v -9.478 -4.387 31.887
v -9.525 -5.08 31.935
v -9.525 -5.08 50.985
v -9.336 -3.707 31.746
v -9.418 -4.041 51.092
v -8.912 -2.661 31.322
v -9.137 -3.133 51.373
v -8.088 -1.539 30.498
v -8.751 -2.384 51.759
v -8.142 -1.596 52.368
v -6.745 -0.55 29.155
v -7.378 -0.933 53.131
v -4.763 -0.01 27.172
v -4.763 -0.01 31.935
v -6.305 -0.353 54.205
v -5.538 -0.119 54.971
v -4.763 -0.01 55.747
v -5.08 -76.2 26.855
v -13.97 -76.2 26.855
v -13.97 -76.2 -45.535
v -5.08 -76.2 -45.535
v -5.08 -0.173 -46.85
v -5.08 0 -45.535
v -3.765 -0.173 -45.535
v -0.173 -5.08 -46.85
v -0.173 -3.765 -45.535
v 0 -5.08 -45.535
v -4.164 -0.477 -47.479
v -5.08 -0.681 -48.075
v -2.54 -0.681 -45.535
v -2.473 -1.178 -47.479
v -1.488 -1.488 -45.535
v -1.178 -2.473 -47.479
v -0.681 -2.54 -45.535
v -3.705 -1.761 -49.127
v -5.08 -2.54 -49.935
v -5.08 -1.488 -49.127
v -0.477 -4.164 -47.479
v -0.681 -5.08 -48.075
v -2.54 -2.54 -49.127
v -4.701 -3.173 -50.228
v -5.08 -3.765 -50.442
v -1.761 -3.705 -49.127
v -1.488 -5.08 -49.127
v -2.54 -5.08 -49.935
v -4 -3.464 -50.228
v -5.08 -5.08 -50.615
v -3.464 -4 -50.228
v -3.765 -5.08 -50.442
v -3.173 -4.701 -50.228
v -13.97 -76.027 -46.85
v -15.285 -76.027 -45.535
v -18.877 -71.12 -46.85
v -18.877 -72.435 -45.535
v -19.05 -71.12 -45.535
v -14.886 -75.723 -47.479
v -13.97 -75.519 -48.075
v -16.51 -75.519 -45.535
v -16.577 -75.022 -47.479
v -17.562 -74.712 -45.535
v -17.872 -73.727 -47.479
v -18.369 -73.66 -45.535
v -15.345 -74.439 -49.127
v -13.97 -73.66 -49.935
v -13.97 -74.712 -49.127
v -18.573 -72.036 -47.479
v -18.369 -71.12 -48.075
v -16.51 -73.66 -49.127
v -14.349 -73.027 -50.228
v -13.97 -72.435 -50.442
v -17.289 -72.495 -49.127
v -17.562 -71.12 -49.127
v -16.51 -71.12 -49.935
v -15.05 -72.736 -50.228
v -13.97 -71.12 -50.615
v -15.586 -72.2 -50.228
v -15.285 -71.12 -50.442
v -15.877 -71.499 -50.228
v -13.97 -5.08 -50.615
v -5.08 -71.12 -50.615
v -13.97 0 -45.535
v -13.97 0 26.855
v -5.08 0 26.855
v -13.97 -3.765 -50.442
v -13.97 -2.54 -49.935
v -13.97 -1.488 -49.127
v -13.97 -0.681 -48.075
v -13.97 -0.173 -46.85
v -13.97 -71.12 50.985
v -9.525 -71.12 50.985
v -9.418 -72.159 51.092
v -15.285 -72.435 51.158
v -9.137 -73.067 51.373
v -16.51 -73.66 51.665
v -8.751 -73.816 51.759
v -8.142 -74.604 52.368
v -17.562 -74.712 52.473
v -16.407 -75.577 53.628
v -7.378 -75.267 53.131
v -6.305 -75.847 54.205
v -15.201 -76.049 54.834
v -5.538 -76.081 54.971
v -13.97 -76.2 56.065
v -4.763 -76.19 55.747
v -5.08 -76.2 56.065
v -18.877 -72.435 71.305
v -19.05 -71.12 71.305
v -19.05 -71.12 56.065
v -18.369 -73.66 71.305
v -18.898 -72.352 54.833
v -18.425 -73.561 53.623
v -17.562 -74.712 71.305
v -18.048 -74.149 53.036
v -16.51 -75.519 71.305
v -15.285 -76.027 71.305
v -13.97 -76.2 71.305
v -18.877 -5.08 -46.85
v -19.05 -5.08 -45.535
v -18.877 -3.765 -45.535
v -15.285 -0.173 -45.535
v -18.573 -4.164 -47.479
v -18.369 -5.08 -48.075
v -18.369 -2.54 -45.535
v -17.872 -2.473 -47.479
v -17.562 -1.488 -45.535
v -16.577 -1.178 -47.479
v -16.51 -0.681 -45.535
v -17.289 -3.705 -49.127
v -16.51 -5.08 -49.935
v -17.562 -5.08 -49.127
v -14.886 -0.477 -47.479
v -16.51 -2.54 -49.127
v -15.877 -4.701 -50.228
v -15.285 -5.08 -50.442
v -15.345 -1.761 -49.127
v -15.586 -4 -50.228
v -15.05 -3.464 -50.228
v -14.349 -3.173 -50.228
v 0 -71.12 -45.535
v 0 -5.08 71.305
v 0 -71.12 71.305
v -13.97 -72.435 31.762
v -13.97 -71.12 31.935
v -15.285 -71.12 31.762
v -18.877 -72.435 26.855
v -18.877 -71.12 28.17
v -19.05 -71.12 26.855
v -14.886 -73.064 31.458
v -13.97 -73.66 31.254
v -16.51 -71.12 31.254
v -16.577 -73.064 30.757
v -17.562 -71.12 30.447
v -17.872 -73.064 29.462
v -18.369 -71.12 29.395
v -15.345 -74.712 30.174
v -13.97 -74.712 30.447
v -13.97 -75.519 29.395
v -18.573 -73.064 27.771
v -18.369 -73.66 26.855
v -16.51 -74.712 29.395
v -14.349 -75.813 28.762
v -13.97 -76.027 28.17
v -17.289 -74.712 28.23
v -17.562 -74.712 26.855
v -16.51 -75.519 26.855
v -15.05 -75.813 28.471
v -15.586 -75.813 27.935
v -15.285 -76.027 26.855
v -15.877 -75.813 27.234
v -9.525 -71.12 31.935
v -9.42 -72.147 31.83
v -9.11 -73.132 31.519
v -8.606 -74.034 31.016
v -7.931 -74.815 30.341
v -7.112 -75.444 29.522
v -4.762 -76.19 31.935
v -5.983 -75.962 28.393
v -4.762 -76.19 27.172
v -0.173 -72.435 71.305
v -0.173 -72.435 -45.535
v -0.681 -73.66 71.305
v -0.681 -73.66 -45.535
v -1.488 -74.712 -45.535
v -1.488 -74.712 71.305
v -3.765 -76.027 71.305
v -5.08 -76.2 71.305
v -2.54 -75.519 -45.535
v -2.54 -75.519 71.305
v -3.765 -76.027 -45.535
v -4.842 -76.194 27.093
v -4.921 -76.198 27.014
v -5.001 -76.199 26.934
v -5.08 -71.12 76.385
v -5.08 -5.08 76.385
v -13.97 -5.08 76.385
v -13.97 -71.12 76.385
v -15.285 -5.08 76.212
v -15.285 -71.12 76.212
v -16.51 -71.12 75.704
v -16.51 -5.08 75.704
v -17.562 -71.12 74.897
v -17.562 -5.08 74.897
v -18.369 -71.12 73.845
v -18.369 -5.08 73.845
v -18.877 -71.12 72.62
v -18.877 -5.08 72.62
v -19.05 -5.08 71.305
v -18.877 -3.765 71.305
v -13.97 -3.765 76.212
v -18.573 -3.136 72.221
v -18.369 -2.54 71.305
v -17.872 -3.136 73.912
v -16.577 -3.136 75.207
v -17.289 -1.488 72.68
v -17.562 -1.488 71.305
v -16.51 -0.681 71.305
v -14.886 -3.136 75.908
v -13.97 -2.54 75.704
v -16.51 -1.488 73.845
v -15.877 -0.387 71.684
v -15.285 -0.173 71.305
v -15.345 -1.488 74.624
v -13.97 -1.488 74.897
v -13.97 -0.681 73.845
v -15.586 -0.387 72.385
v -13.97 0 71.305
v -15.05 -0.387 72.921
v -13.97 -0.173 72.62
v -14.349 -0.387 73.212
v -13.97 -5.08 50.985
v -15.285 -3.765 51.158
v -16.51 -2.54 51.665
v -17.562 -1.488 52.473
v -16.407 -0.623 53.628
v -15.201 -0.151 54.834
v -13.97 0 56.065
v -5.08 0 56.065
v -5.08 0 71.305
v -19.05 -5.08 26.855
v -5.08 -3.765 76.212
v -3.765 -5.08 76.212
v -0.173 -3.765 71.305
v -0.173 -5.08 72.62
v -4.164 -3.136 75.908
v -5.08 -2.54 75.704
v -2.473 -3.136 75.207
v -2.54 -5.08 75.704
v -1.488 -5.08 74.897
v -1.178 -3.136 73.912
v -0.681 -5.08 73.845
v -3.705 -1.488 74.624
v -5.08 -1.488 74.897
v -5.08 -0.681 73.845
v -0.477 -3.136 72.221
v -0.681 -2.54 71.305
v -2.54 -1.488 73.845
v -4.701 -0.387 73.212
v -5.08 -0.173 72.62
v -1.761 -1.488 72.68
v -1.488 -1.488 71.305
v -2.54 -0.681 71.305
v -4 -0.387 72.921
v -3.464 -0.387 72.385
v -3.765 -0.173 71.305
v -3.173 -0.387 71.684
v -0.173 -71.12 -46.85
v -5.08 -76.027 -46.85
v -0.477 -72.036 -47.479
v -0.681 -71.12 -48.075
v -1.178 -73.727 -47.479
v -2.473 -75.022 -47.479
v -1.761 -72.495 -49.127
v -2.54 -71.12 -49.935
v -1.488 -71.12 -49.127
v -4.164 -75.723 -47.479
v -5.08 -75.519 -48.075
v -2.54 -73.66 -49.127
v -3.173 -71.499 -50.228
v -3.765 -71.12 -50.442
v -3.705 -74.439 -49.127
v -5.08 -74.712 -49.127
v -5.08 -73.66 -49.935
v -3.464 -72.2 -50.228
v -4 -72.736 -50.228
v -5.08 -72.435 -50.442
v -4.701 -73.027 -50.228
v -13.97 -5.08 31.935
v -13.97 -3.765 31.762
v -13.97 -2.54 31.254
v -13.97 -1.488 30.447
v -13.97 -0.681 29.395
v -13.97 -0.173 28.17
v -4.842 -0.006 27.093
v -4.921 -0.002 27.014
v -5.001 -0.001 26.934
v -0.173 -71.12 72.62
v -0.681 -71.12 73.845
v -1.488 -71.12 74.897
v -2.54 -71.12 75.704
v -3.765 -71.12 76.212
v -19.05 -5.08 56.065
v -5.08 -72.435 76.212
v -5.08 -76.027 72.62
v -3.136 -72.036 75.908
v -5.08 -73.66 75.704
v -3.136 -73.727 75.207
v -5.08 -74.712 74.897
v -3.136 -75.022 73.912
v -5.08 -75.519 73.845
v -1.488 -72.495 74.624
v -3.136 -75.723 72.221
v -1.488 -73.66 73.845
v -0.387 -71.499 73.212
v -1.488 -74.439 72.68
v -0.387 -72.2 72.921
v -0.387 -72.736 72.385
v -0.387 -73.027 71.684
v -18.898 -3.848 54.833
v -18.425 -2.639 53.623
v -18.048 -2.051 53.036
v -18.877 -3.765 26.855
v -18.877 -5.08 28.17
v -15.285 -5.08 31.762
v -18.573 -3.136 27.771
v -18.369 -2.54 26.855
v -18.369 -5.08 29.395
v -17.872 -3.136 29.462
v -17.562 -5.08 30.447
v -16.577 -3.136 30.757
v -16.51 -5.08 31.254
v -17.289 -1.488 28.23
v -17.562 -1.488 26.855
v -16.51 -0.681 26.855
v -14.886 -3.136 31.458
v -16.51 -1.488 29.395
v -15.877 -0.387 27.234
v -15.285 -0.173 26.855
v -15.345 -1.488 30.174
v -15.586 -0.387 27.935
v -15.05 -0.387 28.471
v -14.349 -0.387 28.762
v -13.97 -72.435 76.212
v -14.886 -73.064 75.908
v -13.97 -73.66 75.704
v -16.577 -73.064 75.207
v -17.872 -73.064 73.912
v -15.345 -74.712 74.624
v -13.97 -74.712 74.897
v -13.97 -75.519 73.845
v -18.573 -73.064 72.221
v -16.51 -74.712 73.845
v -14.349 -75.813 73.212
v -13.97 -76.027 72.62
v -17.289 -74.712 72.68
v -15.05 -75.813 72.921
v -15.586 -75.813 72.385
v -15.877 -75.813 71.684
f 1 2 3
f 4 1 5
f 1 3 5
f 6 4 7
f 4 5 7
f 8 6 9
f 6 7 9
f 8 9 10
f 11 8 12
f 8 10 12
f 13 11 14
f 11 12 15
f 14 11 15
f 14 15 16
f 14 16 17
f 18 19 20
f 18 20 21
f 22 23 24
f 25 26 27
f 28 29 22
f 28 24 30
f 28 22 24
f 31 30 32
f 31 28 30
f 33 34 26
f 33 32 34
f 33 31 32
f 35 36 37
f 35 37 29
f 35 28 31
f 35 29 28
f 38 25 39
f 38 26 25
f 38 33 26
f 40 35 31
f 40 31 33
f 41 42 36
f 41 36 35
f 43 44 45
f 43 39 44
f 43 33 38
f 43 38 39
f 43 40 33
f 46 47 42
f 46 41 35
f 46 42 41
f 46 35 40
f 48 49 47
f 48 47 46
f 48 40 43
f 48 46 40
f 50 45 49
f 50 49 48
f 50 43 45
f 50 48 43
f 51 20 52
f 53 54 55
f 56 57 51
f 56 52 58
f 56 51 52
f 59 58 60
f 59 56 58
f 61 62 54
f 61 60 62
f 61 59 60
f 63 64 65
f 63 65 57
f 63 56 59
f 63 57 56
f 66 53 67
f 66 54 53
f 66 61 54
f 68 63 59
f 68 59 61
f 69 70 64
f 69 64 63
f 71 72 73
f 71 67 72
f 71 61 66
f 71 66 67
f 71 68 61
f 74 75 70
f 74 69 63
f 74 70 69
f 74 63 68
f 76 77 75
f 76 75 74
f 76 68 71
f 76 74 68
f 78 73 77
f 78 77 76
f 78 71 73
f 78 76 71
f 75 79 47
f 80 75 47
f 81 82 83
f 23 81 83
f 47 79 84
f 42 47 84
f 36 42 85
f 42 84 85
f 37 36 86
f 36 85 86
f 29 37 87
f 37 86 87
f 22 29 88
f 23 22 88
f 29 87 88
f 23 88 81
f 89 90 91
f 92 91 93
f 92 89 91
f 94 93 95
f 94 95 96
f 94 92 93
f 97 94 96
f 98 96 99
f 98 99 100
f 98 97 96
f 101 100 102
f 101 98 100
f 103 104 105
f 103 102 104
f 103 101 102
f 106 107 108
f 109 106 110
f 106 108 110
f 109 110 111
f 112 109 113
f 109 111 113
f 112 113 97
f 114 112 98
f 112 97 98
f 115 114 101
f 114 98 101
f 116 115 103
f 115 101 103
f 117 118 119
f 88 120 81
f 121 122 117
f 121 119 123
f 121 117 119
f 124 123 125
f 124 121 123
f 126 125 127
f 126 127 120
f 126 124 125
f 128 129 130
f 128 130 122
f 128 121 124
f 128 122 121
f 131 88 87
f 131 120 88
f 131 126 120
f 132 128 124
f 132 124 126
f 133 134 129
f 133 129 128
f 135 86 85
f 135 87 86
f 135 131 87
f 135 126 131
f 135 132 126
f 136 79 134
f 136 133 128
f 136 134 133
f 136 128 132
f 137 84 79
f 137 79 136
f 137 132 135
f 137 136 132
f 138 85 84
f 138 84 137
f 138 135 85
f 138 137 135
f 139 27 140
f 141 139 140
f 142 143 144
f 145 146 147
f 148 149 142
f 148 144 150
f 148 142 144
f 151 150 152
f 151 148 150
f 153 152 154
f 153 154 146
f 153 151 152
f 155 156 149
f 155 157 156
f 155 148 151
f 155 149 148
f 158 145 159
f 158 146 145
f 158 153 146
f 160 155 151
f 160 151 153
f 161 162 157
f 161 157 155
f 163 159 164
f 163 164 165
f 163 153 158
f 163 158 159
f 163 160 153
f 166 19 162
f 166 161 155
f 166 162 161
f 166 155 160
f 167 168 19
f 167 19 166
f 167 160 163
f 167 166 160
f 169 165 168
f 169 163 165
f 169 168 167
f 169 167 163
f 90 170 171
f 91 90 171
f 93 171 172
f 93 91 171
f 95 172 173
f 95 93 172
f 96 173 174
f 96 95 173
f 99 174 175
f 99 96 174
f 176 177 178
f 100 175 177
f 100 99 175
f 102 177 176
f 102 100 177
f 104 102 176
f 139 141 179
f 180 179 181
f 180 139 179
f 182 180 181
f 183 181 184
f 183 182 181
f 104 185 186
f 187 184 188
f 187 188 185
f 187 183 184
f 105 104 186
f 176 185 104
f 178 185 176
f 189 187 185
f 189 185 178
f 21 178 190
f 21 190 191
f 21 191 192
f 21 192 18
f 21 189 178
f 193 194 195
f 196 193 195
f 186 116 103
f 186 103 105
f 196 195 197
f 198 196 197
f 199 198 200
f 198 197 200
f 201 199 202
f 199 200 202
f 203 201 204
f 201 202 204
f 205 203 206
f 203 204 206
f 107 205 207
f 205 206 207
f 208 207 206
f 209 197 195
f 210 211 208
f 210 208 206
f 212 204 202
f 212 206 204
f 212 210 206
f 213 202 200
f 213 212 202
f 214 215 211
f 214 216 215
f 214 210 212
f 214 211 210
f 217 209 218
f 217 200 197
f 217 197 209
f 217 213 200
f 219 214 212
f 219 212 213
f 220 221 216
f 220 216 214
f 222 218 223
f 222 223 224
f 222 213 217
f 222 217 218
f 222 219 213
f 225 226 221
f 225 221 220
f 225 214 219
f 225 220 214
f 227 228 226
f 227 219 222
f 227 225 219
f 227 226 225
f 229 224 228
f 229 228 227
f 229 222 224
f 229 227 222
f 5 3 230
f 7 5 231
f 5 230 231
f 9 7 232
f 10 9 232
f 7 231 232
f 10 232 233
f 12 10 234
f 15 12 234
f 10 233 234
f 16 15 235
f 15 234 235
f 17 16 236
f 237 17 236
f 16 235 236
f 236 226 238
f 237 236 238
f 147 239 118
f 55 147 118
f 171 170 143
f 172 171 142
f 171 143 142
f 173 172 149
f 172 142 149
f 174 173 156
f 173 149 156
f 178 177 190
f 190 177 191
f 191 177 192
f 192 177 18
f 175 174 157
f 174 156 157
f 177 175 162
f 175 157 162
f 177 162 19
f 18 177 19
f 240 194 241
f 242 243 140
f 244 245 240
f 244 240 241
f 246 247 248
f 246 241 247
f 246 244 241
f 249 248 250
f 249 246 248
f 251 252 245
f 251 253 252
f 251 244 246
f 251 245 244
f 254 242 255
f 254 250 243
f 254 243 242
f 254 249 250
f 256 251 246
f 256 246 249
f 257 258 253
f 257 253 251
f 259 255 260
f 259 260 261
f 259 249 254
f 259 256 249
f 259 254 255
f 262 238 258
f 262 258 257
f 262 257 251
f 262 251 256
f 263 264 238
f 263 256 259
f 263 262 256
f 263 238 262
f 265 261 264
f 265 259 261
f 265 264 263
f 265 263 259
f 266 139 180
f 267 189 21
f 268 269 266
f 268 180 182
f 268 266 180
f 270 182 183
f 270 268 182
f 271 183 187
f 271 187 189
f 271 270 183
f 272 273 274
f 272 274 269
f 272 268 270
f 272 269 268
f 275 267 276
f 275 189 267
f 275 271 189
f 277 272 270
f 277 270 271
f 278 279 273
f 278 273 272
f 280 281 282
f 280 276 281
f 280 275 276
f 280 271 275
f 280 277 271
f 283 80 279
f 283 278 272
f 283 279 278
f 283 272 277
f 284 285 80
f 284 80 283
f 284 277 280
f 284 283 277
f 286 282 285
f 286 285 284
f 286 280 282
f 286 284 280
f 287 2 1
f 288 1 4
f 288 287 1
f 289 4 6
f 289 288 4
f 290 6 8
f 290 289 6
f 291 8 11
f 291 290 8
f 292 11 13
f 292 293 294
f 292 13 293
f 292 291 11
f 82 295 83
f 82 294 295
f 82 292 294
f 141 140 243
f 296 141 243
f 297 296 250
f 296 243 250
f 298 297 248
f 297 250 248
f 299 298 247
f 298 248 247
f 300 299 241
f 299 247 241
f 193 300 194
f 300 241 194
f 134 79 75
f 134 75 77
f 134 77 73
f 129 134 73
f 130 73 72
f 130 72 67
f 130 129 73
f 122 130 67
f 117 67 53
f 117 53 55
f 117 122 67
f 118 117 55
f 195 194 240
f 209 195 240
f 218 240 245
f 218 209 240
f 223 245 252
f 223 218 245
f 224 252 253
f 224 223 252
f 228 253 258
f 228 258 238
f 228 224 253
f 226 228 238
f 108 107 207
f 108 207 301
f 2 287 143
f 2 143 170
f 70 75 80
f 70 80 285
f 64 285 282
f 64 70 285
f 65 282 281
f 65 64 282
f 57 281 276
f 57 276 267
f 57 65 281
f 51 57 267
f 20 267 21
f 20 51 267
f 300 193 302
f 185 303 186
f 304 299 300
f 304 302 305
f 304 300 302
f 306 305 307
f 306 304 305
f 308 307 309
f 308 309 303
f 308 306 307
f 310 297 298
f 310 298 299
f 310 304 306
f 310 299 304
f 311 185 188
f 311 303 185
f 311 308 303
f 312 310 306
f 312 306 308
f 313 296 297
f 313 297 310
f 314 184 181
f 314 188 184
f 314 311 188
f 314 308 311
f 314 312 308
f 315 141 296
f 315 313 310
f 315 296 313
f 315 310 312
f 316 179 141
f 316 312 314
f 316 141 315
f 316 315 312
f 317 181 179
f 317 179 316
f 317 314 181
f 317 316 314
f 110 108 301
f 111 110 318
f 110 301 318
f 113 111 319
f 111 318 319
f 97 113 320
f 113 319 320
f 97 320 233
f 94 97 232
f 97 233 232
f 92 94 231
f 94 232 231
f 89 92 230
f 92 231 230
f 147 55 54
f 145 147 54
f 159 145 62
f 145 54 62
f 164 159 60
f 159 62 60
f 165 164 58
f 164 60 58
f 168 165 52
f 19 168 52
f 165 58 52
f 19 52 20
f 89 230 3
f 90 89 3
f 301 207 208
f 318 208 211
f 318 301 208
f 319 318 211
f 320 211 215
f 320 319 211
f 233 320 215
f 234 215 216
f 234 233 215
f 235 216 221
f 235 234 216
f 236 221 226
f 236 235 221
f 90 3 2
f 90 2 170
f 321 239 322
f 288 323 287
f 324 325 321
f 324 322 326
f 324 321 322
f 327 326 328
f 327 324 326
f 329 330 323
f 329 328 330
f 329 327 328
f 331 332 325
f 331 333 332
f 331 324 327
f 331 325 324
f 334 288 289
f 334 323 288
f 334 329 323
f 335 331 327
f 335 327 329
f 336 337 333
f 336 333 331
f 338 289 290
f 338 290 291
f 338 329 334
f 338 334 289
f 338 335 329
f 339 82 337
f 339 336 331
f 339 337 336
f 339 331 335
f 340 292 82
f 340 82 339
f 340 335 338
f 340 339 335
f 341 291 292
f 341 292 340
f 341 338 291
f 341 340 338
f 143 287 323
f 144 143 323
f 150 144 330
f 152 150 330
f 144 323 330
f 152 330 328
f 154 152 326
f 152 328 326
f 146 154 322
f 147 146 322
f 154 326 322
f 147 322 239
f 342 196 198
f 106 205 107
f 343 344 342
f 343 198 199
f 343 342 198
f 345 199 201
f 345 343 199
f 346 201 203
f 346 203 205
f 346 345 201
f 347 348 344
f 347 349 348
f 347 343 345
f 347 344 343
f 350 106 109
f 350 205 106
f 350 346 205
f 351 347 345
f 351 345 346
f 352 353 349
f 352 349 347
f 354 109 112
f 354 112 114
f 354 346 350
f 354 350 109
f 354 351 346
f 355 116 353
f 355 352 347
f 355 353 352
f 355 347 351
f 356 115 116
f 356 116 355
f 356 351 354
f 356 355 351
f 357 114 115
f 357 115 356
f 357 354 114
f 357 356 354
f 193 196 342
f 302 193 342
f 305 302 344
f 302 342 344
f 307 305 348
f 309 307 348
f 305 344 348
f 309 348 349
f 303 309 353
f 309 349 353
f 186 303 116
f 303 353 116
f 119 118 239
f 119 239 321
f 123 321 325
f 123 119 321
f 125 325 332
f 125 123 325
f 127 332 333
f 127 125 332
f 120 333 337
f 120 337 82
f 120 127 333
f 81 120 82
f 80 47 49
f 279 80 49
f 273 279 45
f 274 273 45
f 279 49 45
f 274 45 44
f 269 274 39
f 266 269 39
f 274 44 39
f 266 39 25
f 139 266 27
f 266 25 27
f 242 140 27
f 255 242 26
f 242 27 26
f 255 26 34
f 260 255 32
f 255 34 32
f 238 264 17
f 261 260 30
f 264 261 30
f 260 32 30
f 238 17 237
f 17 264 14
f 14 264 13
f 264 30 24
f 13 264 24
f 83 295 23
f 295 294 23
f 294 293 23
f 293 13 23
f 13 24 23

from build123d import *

# Parameters (mm, degrees)
F1_DEPTH      = 76.2
F2_T1_DEPTH   = 8.89
F2_T3_DEPTH   = 116.84
F2_T5_DEPTH   = 33.02
F2_T7_DEPTH   = 22.225
F2_T9_DEPTH   = 19.05
F2_T11_DEPTH  = 4.445
F2_T13_DEPTH  = 72.39
F2_T15_DEPTH  = 66.04
F2_S19_W      = 5.08
F2_S19_H      = 5.08
F2_T20_DEPTH  = 5.08
F2_S25_W      = 5.08
F2_S25_H      = 5.08
F2_T26_DEPTH  = 5.08
F2_S31_W      = 5.08
F2_S31_H      = 5.08
F2_T32_DEPTH  = 5.08
F2_S37_W      = 5.08
F2_S37_H      = 5.08
F2_T38_DEPTH  = 5.08
F2_S43_W      = 5.08
F2_S43_H      = 5.08
F2_T44_DEPTH  = 5.08
F2_S49_W      = 5.08
F2_S49_H      = 5.08
F2_T50_DEPTH  = 5.08
F2_S55_W      = 5.08
F2_S55_H      = 5.08
F2_T56_DEPTH  = 5.08
F2_S61_W      = 5.08
F2_S61_H      = 5.08
F2_T62_DEPTH  = 5.08
F2_S67_W      = 5.08
F2_S67_H      = 5.08
F2_T68_DEPTH  = 5.08
F2_S73_W      = 5.08
F2_S73_H      = 5.08
F2_T74_DEPTH  = 5.08
F2_T81_DEPTH  = 34.925
F2_T85_DEPTH  = 31.75
F2_T92_DEPTH  = 31.75
F2_T96_DEPTH  = 17.145
F2_T103_DEPTH = 34.925
F2_T107_DEPTH = 31.75
F2_T114_DEPTH = 31.75
F2_T118_DEPTH = 17.145
F3_T1_DEPTH   = 91.44


# Not quite as in the source:
# - a fillet or chamfer that OpenCascade refuses, or shapes differently, is made with other operations: its cross-section is extruded or revolved along the edge and cut away or added


with BuildPart() as f1:
    # F0 (on Front) → F1 (new body)
    with BuildSketch(Plane.XZ):
        Polygon((-19.05, -50.6151032805), (0, -50.6151032805), (0, 76.3848967195), (-19.05, 76.3848967195), (-19.05, 50.9848967195), (-9.525, 50.9848967195), (-9.525, 31.9348967195), (-19.05, 31.9348967195), align=None)
    extrude(amount=F1_DEPTH)

    # F2: fillet of radius 5.08 on 21 edges, made by hand

    # F2_s2 → F2_t1 (cut)
    with BuildSketch(Plane.YZ.offset(-13.97)):
        with BuildLine():
            ThreePointArc((-71.12, -50.6151032805), (-74.7121024484, -49.127205729), (-76.2, -45.5351032805))
            Line((-76.2, -45.5351032805), (-76.2, -50.6151032805))
            Line((-76.2, -50.6151032805), (-71.12, -50.6151032805))
        make_face()
        with BuildLine():
            ThreePointArc((-71.12, 76.3848967195), (-74.7121024484, 74.8969991679), (-76.2, 71.3048967195))
            Line((-76.2, 71.3048967195), (-76.2, 76.3848967195))
            Line((-76.2, 76.3848967195), (-71.12, 76.3848967195))
        make_face()
        with BuildLine():
            ThreePointArc((-5.08, 76.3848967195), (-1.4878975516, 74.8969991679), (0, 71.3048967195))
            Line((0, 71.3048967195), (0, 76.3848967195))
            Line((0, 76.3848967195), (-5.08, 76.3848967195))
        make_face()
        with BuildLine():
            ThreePointArc((-5.08, -50.6151032805), (-1.4878975516, -49.127205729), (0, -45.5351032805))
            Line((0, -45.5351032805), (0, -50.6151032805))
            Line((0, -50.6151032805), (-5.08, -50.6151032805))
        make_face()
    extrude(amount=F2_T1_DEPTH, mode=Mode.SUBTRACT)

    # F2_s4 → F2_t3 (cut)
    with BuildSketch(Plane.XY.offset(-45.5351032805)):
        with BuildLine():
            ThreePointArc((0, -71.12), (-1.4878975516, -74.7121024484), (-5.08, -76.2))
            Line((-5.08, -76.2), (0, -76.2))
            Line((0, -76.2), (0, -71.12))
        make_face()
        with BuildLine():
            ThreePointArc((0, -5.08), (-1.4878975516, -1.4878975516), (-5.08, 0))
            Line((-5.08, 0), (0, 0))
            Line((0, 0), (0, -5.08))
        make_face()
    extrude(amount=F2_T3_DEPTH, mode=Mode.SUBTRACT)

    # F2_s6 → F2_t5 (cut)
    with BuildSketch(Plane.XY.offset(38.2848967195)):
        with BuildLine():
            ThreePointArc((-19.05, -71.12), (-17.5621024484, -74.7121024484), (-13.97, -76.2))
            Line((-13.97, -76.2), (-19.05, -76.2))
            Line((-19.05, -76.2), (-19.05, -71.12))
        make_face()
        with BuildLine():
            ThreePointArc((-19.05, -5.08), (-17.5621024484, -1.4878975516), (-13.97, 0))
            Line((-13.97, 0), (-19.05, 0))
            Line((-19.05, 0), (-19.05, -5.08))
        make_face()
    extrude(amount=F2_T5_DEPTH, mode=Mode.SUBTRACT)

    # F2_s8 → F2_t7 (cut)
    with BuildSketch(Plane.YZ.offset(-31.75)):
        with BuildLine():
            ThreePointArc((-71.12, 50.9848967195), (-74.7121024484, 52.472794271), (-76.2, 56.0648967195))
            Line((-76.2, 56.0648967195), (-76.2, 50.9848967195))
            Line((-76.2, 50.9848967195), (-71.12, 50.9848967195))
        make_face()
        with BuildLine():
            ThreePointArc((-5.08, 50.9848967195), (-1.4878975516, 52.472794271), (0, 56.0648967195))
            Line((0, 56.0648967195), (0, 50.9848967195))
            Line((0, 50.9848967195), (-5.08, 50.9848967195))
        make_face()
    extrude(amount=F2_T7_DEPTH, mode=Mode.SUBTRACT)

    # F2_s10 → F2_t9 (cut)
    with BuildSketch(Plane.XY.offset(31.9348967195)):
        with BuildLine():
            ThreePointArc((-9.525, -71.12), (-8.0371024484, -74.7121024484), (-4.445, -76.2))
            Line((-4.445, -76.2), (-9.525, -76.2))
            Line((-9.525, -76.2), (-9.525, -71.12))
        make_face()
        with BuildLine():
            ThreePointArc((-9.525, -5.08), (-8.0371024484, -1.4878975516), (-4.445, 0))
            Line((-4.445, 0), (-9.525, 0))
            Line((-9.525, 0), (-9.525, -5.08))
        make_face()
    extrude(amount=F2_T9_DEPTH, mode=Mode.SUBTRACT)

    # F2_s12 → F2_t11 (cut)
    with BuildSketch(Plane.YZ.offset(-13.97)):
        with BuildLine():
            ThreePointArc((-71.12, 31.9348967195), (-74.7121024484, 30.4469991679), (-76.2, 26.8548967195))
            Line((-76.2, 26.8548967195), (-76.2, 31.9348967195))
            Line((-76.2, 31.9348967195), (-71.12, 31.9348967195))
        make_face()
        with BuildLine():
            ThreePointArc((-5.08, 31.9348967195), (-1.4878975516, 30.4469991679), (0, 26.8548967195))
            Line((0, 26.8548967195), (0, 31.9348967195))
            Line((0, 31.9348967195), (-5.08, 31.9348967195))
        make_face()
    extrude(amount=F2_T11_DEPTH, mode=Mode.SUBTRACT)

    # F2_s14 → F2_t13 (cut)
    with BuildSketch(Plane.XY.offset(-45.5351032805)):
        with BuildLine():
            ThreePointArc((-19.05, -71.12), (-17.5621024484, -74.7121024484), (-13.97, -76.2))
            Line((-13.97, -76.2), (-19.05, -76.2))
            Line((-19.05, -76.2), (-19.05, -71.12))
        make_face()
        with BuildLine():
            ThreePointArc((-19.05, -5.08), (-17.5621024484, -1.4878975516), (-13.97, 0))
            Line((-13.97, 0), (-19.05, 0))
            Line((-19.05, 0), (-19.05, -5.08))
        make_face()
    extrude(amount=F2_T13_DEPTH, mode=Mode.SUBTRACT)

    # F2_s16 → F2_t15 (cut)
    with BuildSketch(Plane.XZ.offset(5.08)):
        with BuildLine():
            ThreePointArc((0, 71.3048967195), (-1.4878975516, 74.8969991679), (-5.08, 76.3848967195))
            Line((-5.08, 76.3848967195), (0, 76.3848967195))
            Line((0, 76.3848967195), (0, 71.3048967195))
        make_face()
        with BuildLine():
            ThreePointArc((-13.97, 76.3848967195), (-17.5621024484, 74.8969991679), (-19.05, 71.3048967195))
            Line((-19.05, 71.3048967195), (-19.05, 76.3848967195))
            Line((-19.05, 76.3848967195), (-13.97, 76.3848967195))
        make_face()
        with BuildLine():
            ThreePointArc((-13.97, 31.9348967195), (-17.5621024484, 30.4469991679), (-19.05, 26.8548967195))
            Line((-19.05, 26.8548967195), (-19.05, 31.9348967195))
            Line((-19.05, 31.9348967195), (-13.97, 31.9348967195))
        make_face()
        with BuildLine():
            ThreePointArc((-13.97, -50.6151032805), (-17.5621024484, -49.127205729), (-19.05, -45.5351032805))
            Line((-19.05, -45.5351032805), (-19.05, -50.6151032805))
            Line((-19.05, -50.6151032805), (-13.97, -50.6151032805))
        make_face()
        with BuildLine():
            ThreePointArc((-5.08, -50.6151032805), (-1.4878975516, -49.127205729), (0, -45.5351032805))
            Line((0, -45.5351032805), (0, -50.6151032805))
            Line((0, -50.6151032805), (-5.08, -50.6151032805))
        make_face()
    extrude(amount=F2_T15_DEPTH, mode=Mode.SUBTRACT)


with BuildPart() as f2_tool18:
    # F2_s19 → F2_t20 (new body)
    with BuildSketch(Plane.XY.offset(-45.5351032805)):
        with Locations((-16.51, -73.66)):
            Rectangle(F2_S19_W, F2_S19_H)
    extrude(amount=-F2_T20_DEPTH)

    # F2_s21 → F2_t22 (revolve, cut)
    with BuildSketch(Plane(origin=(-13.97, -71.12, -45.5351032805), x_dir=(0.7071067812, 0.7071067812, 0), z_dir=(-0.7071067812, 0.7071067812, 0))):
        with BuildLine():
            ThreePointArc((0, -5.08), (5.08, 0), (0, 5.08))
            Line((0, 5.08), (0, -5.08))
        make_face()
    revolve(axis=Axis((-13.97, -71.12, -45.5351032805), (0, 0, -1)), mode=Mode.SUBTRACT)


with BuildPart() as f1_1:
    add(f1.part)

    # F2_t17: cut F2_tool18
    add(f2_tool18.part, mode=Mode.SUBTRACT)


with BuildPart() as f2_tool24:
    # F2_s25 → F2_t26 (new body)
    with BuildSketch(Plane.XY.offset(-45.5351032805)):
        with Locations((-2.54, -73.66)):
            Rectangle(F2_S25_W, F2_S25_H)
    extrude(amount=-F2_T26_DEPTH)

    # F2_s27 → F2_t28 (revolve, cut)
    with BuildSketch(Plane(origin=(-5.08, -71.12, -45.5351032805), x_dir=(-0.7071067812, 0.7071067812, 0), z_dir=(-0.7071067812, -0.7071067812, 0))):
        with BuildLine():
            ThreePointArc((0, -5.08), (5.08, 0), (0, 5.08))
            Line((0, 5.08), (0, -5.08))
        make_face()
    revolve(axis=Axis((-5.08, -71.12, -45.5351032805), (0, 0, -1)), mode=Mode.SUBTRACT)


with BuildPart() as f1_2:
    add(f1_1.part)

    # F2_t23: cut F2_tool24
    add(f2_tool24.part, mode=Mode.SUBTRACT)


with BuildPart() as f2_tool30:
    # F2_s31 → F2_t32 (new body)
    with BuildSketch(Plane.YZ.offset(-5.08)):
        with Locations((-73.66, 73.8448967195)):
            Rectangle(F2_S31_W, F2_S31_H)
    extrude(amount=F2_T32_DEPTH)

    # F2_s33 → F2_t34 (revolve, cut)
    with BuildSketch(Plane(origin=(-5.08, -71.12, 71.3048967195), x_dir=(0, 0.7071067812, -0.7071067812), z_dir=(0, -0.7071067812, -0.7071067812))):
        with BuildLine():
            ThreePointArc((0, -5.08), (5.08, 0), (0, 5.08))
            Line((0, 5.08), (0, -5.08))
        make_face()
    revolve(axis=Axis((-5.08, -71.12, 71.3048967195), (1, 0, 0)), mode=Mode.SUBTRACT)


with BuildPart() as f1_3:
    add(f1_2.part)

    # F2_t29: cut F2_tool30
    add(f2_tool30.part, mode=Mode.SUBTRACT)


with BuildPart() as f2_tool36:
    # F2_s37 → F2_t38 (new body)
    with BuildSketch(Plane.XZ.offset(71.12)):
        with Locations((-16.51, 73.8448967195)):
            Rectangle(F2_S37_W, F2_S37_H)
    extrude(amount=F2_T38_DEPTH)

    # F2_s39 → F2_t40 (revolve, cut)
    with BuildSketch(Plane(origin=(-13.97, -71.12, 71.3048967195), x_dir=(0.7071067812, 0, -0.7071067812), z_dir=(-0.7071067812, 0, -0.7071067812))):
        with BuildLine():
            ThreePointArc((0, -5.08), (5.08, 0), (0, 5.08))
            Line((0, 5.08), (0, -5.08))
        make_face()
    revolve(axis=Axis((-13.97, -71.12, 71.3048967195), (0, -1, 0)), mode=Mode.SUBTRACT)


with BuildPart() as f1_4:
    add(f1_3.part)

    # F2_t35: cut F2_tool36
    add(f2_tool36.part, mode=Mode.SUBTRACT)


with BuildPart() as f2_tool42:
    # F2_s43 → F2_t44 (new body)
    with BuildSketch(Plane.XZ.offset(71.12)):
        with Locations((-16.51, 29.3948967195)):
            Rectangle(F2_S43_W, F2_S43_H)
    extrude(amount=F2_T44_DEPTH)

    # F2_s45 → F2_t46 (revolve, cut)
    with BuildSketch(Plane(origin=(-13.97, -71.12, 26.8548967195), x_dir=(0.7071067812, 0, -0.7071067812), z_dir=(-0.7071067812, 0, -0.7071067812))):
        with BuildLine():
            ThreePointArc((0, -5.08), (5.08, 0), (0, 5.08))
            Line((0, 5.08), (0, -5.08))
        make_face()
    revolve(axis=Axis((-13.97, -71.12, 26.8548967195), (0, -1, 0)), mode=Mode.SUBTRACT)


with BuildPart() as f1_5:
    add(f1_4.part)

    # F2_t41: cut F2_tool42
    add(f2_tool42.part, mode=Mode.SUBTRACT)


with BuildPart() as f2_tool48:
    # F2_s49 → F2_t50 (new body)
    with BuildSketch(Plane.XZ.offset(5.08)):
        with Locations((-2.54, 73.8448967195)):
            Rectangle(F2_S49_W, F2_S49_H)
    extrude(amount=-F2_T50_DEPTH)

    # F2_s51 → F2_t52 (revolve, cut)
    with BuildSketch(Plane(origin=(-5.08, -5.08, 71.3048967195), x_dir=(-0.7071067812, 0, -0.7071067812), z_dir=(0.7071067812, 0, -0.7071067812))):
        with BuildLine():
            ThreePointArc((0, -5.08), (5.08, 0), (0, 5.08))
            Line((0, 5.08), (0, -5.08))
        make_face()
    revolve(axis=Axis((-5.08, -5.08, 71.3048967195), (0, 1, 0)), mode=Mode.SUBTRACT)


with BuildPart() as f1_6:
    add(f1_5.part)

    # F2_t47: cut F2_tool48
    add(f2_tool48.part, mode=Mode.SUBTRACT)


with BuildPart() as f2_tool54:
    # F2_s55 → F2_t56 (new body)
    with BuildSketch(Plane.XZ.offset(5.08)):
        with Locations((-16.51, 73.8448967195)):
            Rectangle(F2_S55_W, F2_S55_H)
    extrude(amount=-F2_T56_DEPTH)

    # F2_s57 → F2_t58 (revolve, cut)
    with BuildSketch(Plane(origin=(-13.97, -5.08, 71.3048967195), x_dir=(0.7071067812, 0, -0.7071067812), z_dir=(0.7071067812, 0, 0.7071067812))):
        with BuildLine():
            ThreePointArc((0, -5.08), (5.08, 0), (0, 5.08))
            Line((0, 5.08), (0, -5.08))
        make_face()
    revolve(axis=Axis((-13.97, -5.08, 71.3048967195), (0, 1, 0)), mode=Mode.SUBTRACT)


with BuildPart() as f1_7:
    add(f1_6.part)

    # F2_t53: cut F2_tool54
    add(f2_tool54.part, mode=Mode.SUBTRACT)


with BuildPart() as f2_tool60:
    # F2_s61 → F2_t62 (new body)
    with BuildSketch(Plane.XZ.offset(5.08)):
        with Locations((-16.51, 29.3948967195)):
            Rectangle(F2_S61_W, F2_S61_H)
    extrude(amount=-F2_T62_DEPTH)

    # F2_s63 → F2_t64 (revolve, cut)
    with BuildSketch(Plane(origin=(-13.97, -5.08, 26.8548967195), x_dir=(0.7071067812, 0, -0.7071067812), z_dir=(0.7071067812, 0, 0.7071067812))):
        with BuildLine():
            ThreePointArc((0, -5.08), (5.08, 0), (0, 5.08))
            Line((0, 5.08), (0, -5.08))
        make_face()
    revolve(axis=Axis((-13.97, -5.08, 26.8548967195), (0, 1, 0)), mode=Mode.SUBTRACT)


with BuildPart() as f1_8:
    add(f1_7.part)

    # F2_t59: cut F2_tool60
    add(f2_tool60.part, mode=Mode.SUBTRACT)


with BuildPart() as f2_tool66:
    # F2_s67 → F2_t68 (new body)
    with BuildSketch(Plane.XY.offset(-45.5351032805)):
        with Locations((-16.51, -2.54)):
            Rectangle(F2_S67_W, F2_S67_H)
    extrude(amount=-F2_T68_DEPTH)

    # F2_s69 → F2_t70 (revolve, cut)
    with BuildSketch(Plane(origin=(-13.97, -5.08, -45.5351032805), x_dir=(0.7071067812, -0.7071067812, 0), z_dir=(0.7071067812, 0.7071067812, 0))):
        with BuildLine():
            ThreePointArc((0, -5.08), (5.08, 0), (0, 5.08))
            Line((0, 5.08), (0, -5.08))
        make_face()
    revolve(axis=Axis((-13.97, -5.08, -45.5351032805), (0, 0, -1)), mode=Mode.SUBTRACT)


with BuildPart() as f1_9:
    add(f1_8.part)

    # F2_t65: cut F2_tool66
    add(f2_tool66.part, mode=Mode.SUBTRACT)


with BuildPart() as f2_tool72:
    # F2_s73 → F2_t74 (new body)
    with BuildSketch(Plane.XY.offset(-45.5351032805)):
        with Locations((-2.54, -2.54)):
            Rectangle(F2_S73_W, F2_S73_H)
    extrude(amount=-F2_T74_DEPTH)

    # F2_s75 → F2_t76 (revolve, cut)
    with BuildSketch(Plane(origin=(-5.08, -5.08, -45.5351032805), x_dir=(-0.7071067812, -0.7071067812, 0), z_dir=(0.7071067812, -0.7071067812, 0))):
        with BuildLine():
            ThreePointArc((0, -5.08), (5.08, 0), (0, 5.08))
            Line((0, 5.08), (0, -5.08))
        make_face()
    revolve(axis=Axis((-5.08, -5.08, -45.5351032805), (0, 0, -1)), mode=Mode.SUBTRACT)


with BuildPart() as f1_10:
    add(f1_9.part)

    # F2_t71: cut F2_tool72
    add(f2_tool72.part, mode=Mode.SUBTRACT)


with BuildPart() as f2_tool79:
    # F2_s80 → F2_t81 (new body)
    with BuildSketch(Plane.YZ.offset(-31.75)):
        with BuildLine():
            ThreePointArc((-71.12, 50.9848967195), (-74.7121024484, 52.472794271), (-76.2, 56.0648967195))
            Line((-76.2, 56.0648967195), (-76.2, 50.9848967195))
            Line((-76.2, 50.9848967195), (-71.12, 50.9848967195))
        make_face()
    extrude(amount=F2_T81_DEPTH)

    split(bisect_by=Plane.YZ.offset(-9.525), keep=Keep.TOP)


with BuildPart() as f2_tool83:
    # F2_s84 → F2_t85 (new body)
    with BuildSketch(Plane.XY.offset(63.6848967195)):
        with BuildLine():
            ThreePointArc((-9.525, -71.12), (-8.0371024484, -74.7121024484), (-4.445, -76.2))
            Line((-4.445, -76.2), (-9.525, -76.2))
            Line((-9.525, -76.2), (-9.525, -71.12))
        make_face()
    extrude(amount=-F2_T85_DEPTH)

    split(bisect_by=Plane.XY.offset(50.9848967195), keep=Keep.TOP)


with BuildPart() as f2_tool79_1:
    add(f2_tool79.part)

    # F2_t87: intersect F2_tool83
    add(f2_tool83.part, mode=Mode.INTERSECT)


with BuildPart() as f1_11:
    add(f1_10.part)

    # F2_t77: cut F2_tool79
    add(f2_tool79_1.part, mode=Mode.SUBTRACT)


with BuildPart() as f2_tool90:
    # F2_s91 → F2_t92 (new body)
    with BuildSketch(Plane.XY.offset(50.9848967195)):
        with BuildLine():
            ThreePointArc((-9.525, -71.12), (-8.0371024484, -74.7121024484), (-4.445, -76.2))
            Line((-4.445, -76.2), (-9.525, -76.2))
            Line((-9.525, -76.2), (-9.525, -71.12))
        make_face()
    extrude(amount=-F2_T92_DEPTH)

    split(bisect_by=Plane.XY.offset(31.9348967195), keep=Keep.BOTTOM)


with BuildPart() as f2_tool94:
    # F2_s95 → F2_t96 (new body)
    with BuildSketch(Plane.YZ.offset(3.175)):
        with BuildLine():
            ThreePointArc((-71.12, 31.9348967195), (-74.7121024484, 30.4469991679), (-76.2, 26.8548967195))
            Line((-76.2, 26.8548967195), (-76.2, 31.9348967195))
            Line((-76.2, 31.9348967195), (-71.12, 31.9348967195))
        make_face()
    extrude(amount=-F2_T96_DEPTH)

    split(bisect_by=Plane.YZ.offset(-9.525), keep=Keep.TOP)


with BuildPart() as f2_tool90_1:
    add(f2_tool90.part)

    # F2_t98: intersect F2_tool94
    add(f2_tool94.part, mode=Mode.INTERSECT)


with BuildPart() as f1_12:
    add(f1_11.part)

    # F2_t88: cut F2_tool90
    add(f2_tool90_1.part, mode=Mode.SUBTRACT)


with BuildPart() as f2_tool101:
    # F2_s102 → F2_t103 (new body)
    with BuildSketch(Plane.YZ.offset(-31.75)):
        with BuildLine():
            ThreePointArc((-5.08, 50.9848967195), (-1.4878975516, 52.472794271), (0, 56.0648967195))
            Line((0, 56.0648967195), (0, 50.9848967195))
            Line((0, 50.9848967195), (-5.08, 50.9848967195))
        make_face()
    extrude(amount=F2_T103_DEPTH)

    split(bisect_by=Plane.YZ.offset(-9.525), keep=Keep.TOP)


with BuildPart() as f2_tool105:
    # F2_s106 → F2_t107 (new body)
    with BuildSketch(Plane.XY.offset(63.6848967195)):
        with BuildLine():
            ThreePointArc((-9.525, -5.08), (-8.0371024484, -1.4878975516), (-4.445, 0))
            Line((-4.445, 0), (-9.525, 0))
            Line((-9.525, 0), (-9.525, -5.08))
        make_face()
    extrude(amount=-F2_T107_DEPTH)

    split(bisect_by=Plane.XY.offset(50.9848967195), keep=Keep.TOP)


with BuildPart() as f2_tool101_1:
    add(f2_tool101.part)

    # F2_t109: intersect F2_tool105
    add(f2_tool105.part, mode=Mode.INTERSECT)


with BuildPart() as f1_13:
    add(f1_12.part)

    # F2_t99: cut F2_tool101
    add(f2_tool101_1.part, mode=Mode.SUBTRACT)


with BuildPart() as f2_tool112:
    # F2_s113 → F2_t114 (new body)
    with BuildSketch(Plane.XY.offset(50.9848967195)):
        with BuildLine():
            ThreePointArc((-9.525, -5.08), (-8.0371024484, -1.4878975516), (-4.445, 0))
            Line((-4.445, 0), (-9.525, 0))
            Line((-9.525, 0), (-9.525, -5.08))
        make_face()
    extrude(amount=-F2_T114_DEPTH)

    split(bisect_by=Plane.XY.offset(31.9348967195), keep=Keep.BOTTOM)


with BuildPart() as f2_tool116:
    # F2_s117 → F2_t118 (new body)
    with BuildSketch(Plane.YZ.offset(3.175)):
        with BuildLine():
            ThreePointArc((-5.08, 31.9348967195), (-1.4878975516, 30.4469991679), (0, 26.8548967195))
            Line((0, 26.8548967195), (0, 31.9348967195))
            Line((0, 31.9348967195), (-5.08, 31.9348967195))
        make_face()
    extrude(amount=-F2_T118_DEPTH)

    split(bisect_by=Plane.YZ.offset(-9.525), keep=Keep.TOP)


with BuildPart() as f2_tool112_1:
    add(f2_tool112.part)

    # F2_t120: intersect F2_tool116
    add(f2_tool116.part, mode=Mode.INTERSECT)


with BuildPart() as f1_14:
    add(f1_13.part)

    # F2_t110: cut F2_tool112
    add(f2_tool112_1.part, mode=Mode.SUBTRACT)

    # F3: fillet of radius 5.08 on 4 edges, made by hand

    # F3_s2 → F3_t1 (cut)
    with BuildSketch(Plane.XZ.offset(-7.62)):
        with BuildLine():
            ThreePointArc((-19.05, 56.0648967195), (-17.5621024484, 52.472794271), (-13.97, 50.9848967195))
            Line((-13.97, 50.9848967195), (-19.05, 50.9848967195))
            Line((-19.05, 50.9848967195), (-19.05, 56.0648967195))
        make_face()
    extrude(amount=F3_T1_DEPTH, mode=Mode.SUBTRACT)


solid = f1_14.part
